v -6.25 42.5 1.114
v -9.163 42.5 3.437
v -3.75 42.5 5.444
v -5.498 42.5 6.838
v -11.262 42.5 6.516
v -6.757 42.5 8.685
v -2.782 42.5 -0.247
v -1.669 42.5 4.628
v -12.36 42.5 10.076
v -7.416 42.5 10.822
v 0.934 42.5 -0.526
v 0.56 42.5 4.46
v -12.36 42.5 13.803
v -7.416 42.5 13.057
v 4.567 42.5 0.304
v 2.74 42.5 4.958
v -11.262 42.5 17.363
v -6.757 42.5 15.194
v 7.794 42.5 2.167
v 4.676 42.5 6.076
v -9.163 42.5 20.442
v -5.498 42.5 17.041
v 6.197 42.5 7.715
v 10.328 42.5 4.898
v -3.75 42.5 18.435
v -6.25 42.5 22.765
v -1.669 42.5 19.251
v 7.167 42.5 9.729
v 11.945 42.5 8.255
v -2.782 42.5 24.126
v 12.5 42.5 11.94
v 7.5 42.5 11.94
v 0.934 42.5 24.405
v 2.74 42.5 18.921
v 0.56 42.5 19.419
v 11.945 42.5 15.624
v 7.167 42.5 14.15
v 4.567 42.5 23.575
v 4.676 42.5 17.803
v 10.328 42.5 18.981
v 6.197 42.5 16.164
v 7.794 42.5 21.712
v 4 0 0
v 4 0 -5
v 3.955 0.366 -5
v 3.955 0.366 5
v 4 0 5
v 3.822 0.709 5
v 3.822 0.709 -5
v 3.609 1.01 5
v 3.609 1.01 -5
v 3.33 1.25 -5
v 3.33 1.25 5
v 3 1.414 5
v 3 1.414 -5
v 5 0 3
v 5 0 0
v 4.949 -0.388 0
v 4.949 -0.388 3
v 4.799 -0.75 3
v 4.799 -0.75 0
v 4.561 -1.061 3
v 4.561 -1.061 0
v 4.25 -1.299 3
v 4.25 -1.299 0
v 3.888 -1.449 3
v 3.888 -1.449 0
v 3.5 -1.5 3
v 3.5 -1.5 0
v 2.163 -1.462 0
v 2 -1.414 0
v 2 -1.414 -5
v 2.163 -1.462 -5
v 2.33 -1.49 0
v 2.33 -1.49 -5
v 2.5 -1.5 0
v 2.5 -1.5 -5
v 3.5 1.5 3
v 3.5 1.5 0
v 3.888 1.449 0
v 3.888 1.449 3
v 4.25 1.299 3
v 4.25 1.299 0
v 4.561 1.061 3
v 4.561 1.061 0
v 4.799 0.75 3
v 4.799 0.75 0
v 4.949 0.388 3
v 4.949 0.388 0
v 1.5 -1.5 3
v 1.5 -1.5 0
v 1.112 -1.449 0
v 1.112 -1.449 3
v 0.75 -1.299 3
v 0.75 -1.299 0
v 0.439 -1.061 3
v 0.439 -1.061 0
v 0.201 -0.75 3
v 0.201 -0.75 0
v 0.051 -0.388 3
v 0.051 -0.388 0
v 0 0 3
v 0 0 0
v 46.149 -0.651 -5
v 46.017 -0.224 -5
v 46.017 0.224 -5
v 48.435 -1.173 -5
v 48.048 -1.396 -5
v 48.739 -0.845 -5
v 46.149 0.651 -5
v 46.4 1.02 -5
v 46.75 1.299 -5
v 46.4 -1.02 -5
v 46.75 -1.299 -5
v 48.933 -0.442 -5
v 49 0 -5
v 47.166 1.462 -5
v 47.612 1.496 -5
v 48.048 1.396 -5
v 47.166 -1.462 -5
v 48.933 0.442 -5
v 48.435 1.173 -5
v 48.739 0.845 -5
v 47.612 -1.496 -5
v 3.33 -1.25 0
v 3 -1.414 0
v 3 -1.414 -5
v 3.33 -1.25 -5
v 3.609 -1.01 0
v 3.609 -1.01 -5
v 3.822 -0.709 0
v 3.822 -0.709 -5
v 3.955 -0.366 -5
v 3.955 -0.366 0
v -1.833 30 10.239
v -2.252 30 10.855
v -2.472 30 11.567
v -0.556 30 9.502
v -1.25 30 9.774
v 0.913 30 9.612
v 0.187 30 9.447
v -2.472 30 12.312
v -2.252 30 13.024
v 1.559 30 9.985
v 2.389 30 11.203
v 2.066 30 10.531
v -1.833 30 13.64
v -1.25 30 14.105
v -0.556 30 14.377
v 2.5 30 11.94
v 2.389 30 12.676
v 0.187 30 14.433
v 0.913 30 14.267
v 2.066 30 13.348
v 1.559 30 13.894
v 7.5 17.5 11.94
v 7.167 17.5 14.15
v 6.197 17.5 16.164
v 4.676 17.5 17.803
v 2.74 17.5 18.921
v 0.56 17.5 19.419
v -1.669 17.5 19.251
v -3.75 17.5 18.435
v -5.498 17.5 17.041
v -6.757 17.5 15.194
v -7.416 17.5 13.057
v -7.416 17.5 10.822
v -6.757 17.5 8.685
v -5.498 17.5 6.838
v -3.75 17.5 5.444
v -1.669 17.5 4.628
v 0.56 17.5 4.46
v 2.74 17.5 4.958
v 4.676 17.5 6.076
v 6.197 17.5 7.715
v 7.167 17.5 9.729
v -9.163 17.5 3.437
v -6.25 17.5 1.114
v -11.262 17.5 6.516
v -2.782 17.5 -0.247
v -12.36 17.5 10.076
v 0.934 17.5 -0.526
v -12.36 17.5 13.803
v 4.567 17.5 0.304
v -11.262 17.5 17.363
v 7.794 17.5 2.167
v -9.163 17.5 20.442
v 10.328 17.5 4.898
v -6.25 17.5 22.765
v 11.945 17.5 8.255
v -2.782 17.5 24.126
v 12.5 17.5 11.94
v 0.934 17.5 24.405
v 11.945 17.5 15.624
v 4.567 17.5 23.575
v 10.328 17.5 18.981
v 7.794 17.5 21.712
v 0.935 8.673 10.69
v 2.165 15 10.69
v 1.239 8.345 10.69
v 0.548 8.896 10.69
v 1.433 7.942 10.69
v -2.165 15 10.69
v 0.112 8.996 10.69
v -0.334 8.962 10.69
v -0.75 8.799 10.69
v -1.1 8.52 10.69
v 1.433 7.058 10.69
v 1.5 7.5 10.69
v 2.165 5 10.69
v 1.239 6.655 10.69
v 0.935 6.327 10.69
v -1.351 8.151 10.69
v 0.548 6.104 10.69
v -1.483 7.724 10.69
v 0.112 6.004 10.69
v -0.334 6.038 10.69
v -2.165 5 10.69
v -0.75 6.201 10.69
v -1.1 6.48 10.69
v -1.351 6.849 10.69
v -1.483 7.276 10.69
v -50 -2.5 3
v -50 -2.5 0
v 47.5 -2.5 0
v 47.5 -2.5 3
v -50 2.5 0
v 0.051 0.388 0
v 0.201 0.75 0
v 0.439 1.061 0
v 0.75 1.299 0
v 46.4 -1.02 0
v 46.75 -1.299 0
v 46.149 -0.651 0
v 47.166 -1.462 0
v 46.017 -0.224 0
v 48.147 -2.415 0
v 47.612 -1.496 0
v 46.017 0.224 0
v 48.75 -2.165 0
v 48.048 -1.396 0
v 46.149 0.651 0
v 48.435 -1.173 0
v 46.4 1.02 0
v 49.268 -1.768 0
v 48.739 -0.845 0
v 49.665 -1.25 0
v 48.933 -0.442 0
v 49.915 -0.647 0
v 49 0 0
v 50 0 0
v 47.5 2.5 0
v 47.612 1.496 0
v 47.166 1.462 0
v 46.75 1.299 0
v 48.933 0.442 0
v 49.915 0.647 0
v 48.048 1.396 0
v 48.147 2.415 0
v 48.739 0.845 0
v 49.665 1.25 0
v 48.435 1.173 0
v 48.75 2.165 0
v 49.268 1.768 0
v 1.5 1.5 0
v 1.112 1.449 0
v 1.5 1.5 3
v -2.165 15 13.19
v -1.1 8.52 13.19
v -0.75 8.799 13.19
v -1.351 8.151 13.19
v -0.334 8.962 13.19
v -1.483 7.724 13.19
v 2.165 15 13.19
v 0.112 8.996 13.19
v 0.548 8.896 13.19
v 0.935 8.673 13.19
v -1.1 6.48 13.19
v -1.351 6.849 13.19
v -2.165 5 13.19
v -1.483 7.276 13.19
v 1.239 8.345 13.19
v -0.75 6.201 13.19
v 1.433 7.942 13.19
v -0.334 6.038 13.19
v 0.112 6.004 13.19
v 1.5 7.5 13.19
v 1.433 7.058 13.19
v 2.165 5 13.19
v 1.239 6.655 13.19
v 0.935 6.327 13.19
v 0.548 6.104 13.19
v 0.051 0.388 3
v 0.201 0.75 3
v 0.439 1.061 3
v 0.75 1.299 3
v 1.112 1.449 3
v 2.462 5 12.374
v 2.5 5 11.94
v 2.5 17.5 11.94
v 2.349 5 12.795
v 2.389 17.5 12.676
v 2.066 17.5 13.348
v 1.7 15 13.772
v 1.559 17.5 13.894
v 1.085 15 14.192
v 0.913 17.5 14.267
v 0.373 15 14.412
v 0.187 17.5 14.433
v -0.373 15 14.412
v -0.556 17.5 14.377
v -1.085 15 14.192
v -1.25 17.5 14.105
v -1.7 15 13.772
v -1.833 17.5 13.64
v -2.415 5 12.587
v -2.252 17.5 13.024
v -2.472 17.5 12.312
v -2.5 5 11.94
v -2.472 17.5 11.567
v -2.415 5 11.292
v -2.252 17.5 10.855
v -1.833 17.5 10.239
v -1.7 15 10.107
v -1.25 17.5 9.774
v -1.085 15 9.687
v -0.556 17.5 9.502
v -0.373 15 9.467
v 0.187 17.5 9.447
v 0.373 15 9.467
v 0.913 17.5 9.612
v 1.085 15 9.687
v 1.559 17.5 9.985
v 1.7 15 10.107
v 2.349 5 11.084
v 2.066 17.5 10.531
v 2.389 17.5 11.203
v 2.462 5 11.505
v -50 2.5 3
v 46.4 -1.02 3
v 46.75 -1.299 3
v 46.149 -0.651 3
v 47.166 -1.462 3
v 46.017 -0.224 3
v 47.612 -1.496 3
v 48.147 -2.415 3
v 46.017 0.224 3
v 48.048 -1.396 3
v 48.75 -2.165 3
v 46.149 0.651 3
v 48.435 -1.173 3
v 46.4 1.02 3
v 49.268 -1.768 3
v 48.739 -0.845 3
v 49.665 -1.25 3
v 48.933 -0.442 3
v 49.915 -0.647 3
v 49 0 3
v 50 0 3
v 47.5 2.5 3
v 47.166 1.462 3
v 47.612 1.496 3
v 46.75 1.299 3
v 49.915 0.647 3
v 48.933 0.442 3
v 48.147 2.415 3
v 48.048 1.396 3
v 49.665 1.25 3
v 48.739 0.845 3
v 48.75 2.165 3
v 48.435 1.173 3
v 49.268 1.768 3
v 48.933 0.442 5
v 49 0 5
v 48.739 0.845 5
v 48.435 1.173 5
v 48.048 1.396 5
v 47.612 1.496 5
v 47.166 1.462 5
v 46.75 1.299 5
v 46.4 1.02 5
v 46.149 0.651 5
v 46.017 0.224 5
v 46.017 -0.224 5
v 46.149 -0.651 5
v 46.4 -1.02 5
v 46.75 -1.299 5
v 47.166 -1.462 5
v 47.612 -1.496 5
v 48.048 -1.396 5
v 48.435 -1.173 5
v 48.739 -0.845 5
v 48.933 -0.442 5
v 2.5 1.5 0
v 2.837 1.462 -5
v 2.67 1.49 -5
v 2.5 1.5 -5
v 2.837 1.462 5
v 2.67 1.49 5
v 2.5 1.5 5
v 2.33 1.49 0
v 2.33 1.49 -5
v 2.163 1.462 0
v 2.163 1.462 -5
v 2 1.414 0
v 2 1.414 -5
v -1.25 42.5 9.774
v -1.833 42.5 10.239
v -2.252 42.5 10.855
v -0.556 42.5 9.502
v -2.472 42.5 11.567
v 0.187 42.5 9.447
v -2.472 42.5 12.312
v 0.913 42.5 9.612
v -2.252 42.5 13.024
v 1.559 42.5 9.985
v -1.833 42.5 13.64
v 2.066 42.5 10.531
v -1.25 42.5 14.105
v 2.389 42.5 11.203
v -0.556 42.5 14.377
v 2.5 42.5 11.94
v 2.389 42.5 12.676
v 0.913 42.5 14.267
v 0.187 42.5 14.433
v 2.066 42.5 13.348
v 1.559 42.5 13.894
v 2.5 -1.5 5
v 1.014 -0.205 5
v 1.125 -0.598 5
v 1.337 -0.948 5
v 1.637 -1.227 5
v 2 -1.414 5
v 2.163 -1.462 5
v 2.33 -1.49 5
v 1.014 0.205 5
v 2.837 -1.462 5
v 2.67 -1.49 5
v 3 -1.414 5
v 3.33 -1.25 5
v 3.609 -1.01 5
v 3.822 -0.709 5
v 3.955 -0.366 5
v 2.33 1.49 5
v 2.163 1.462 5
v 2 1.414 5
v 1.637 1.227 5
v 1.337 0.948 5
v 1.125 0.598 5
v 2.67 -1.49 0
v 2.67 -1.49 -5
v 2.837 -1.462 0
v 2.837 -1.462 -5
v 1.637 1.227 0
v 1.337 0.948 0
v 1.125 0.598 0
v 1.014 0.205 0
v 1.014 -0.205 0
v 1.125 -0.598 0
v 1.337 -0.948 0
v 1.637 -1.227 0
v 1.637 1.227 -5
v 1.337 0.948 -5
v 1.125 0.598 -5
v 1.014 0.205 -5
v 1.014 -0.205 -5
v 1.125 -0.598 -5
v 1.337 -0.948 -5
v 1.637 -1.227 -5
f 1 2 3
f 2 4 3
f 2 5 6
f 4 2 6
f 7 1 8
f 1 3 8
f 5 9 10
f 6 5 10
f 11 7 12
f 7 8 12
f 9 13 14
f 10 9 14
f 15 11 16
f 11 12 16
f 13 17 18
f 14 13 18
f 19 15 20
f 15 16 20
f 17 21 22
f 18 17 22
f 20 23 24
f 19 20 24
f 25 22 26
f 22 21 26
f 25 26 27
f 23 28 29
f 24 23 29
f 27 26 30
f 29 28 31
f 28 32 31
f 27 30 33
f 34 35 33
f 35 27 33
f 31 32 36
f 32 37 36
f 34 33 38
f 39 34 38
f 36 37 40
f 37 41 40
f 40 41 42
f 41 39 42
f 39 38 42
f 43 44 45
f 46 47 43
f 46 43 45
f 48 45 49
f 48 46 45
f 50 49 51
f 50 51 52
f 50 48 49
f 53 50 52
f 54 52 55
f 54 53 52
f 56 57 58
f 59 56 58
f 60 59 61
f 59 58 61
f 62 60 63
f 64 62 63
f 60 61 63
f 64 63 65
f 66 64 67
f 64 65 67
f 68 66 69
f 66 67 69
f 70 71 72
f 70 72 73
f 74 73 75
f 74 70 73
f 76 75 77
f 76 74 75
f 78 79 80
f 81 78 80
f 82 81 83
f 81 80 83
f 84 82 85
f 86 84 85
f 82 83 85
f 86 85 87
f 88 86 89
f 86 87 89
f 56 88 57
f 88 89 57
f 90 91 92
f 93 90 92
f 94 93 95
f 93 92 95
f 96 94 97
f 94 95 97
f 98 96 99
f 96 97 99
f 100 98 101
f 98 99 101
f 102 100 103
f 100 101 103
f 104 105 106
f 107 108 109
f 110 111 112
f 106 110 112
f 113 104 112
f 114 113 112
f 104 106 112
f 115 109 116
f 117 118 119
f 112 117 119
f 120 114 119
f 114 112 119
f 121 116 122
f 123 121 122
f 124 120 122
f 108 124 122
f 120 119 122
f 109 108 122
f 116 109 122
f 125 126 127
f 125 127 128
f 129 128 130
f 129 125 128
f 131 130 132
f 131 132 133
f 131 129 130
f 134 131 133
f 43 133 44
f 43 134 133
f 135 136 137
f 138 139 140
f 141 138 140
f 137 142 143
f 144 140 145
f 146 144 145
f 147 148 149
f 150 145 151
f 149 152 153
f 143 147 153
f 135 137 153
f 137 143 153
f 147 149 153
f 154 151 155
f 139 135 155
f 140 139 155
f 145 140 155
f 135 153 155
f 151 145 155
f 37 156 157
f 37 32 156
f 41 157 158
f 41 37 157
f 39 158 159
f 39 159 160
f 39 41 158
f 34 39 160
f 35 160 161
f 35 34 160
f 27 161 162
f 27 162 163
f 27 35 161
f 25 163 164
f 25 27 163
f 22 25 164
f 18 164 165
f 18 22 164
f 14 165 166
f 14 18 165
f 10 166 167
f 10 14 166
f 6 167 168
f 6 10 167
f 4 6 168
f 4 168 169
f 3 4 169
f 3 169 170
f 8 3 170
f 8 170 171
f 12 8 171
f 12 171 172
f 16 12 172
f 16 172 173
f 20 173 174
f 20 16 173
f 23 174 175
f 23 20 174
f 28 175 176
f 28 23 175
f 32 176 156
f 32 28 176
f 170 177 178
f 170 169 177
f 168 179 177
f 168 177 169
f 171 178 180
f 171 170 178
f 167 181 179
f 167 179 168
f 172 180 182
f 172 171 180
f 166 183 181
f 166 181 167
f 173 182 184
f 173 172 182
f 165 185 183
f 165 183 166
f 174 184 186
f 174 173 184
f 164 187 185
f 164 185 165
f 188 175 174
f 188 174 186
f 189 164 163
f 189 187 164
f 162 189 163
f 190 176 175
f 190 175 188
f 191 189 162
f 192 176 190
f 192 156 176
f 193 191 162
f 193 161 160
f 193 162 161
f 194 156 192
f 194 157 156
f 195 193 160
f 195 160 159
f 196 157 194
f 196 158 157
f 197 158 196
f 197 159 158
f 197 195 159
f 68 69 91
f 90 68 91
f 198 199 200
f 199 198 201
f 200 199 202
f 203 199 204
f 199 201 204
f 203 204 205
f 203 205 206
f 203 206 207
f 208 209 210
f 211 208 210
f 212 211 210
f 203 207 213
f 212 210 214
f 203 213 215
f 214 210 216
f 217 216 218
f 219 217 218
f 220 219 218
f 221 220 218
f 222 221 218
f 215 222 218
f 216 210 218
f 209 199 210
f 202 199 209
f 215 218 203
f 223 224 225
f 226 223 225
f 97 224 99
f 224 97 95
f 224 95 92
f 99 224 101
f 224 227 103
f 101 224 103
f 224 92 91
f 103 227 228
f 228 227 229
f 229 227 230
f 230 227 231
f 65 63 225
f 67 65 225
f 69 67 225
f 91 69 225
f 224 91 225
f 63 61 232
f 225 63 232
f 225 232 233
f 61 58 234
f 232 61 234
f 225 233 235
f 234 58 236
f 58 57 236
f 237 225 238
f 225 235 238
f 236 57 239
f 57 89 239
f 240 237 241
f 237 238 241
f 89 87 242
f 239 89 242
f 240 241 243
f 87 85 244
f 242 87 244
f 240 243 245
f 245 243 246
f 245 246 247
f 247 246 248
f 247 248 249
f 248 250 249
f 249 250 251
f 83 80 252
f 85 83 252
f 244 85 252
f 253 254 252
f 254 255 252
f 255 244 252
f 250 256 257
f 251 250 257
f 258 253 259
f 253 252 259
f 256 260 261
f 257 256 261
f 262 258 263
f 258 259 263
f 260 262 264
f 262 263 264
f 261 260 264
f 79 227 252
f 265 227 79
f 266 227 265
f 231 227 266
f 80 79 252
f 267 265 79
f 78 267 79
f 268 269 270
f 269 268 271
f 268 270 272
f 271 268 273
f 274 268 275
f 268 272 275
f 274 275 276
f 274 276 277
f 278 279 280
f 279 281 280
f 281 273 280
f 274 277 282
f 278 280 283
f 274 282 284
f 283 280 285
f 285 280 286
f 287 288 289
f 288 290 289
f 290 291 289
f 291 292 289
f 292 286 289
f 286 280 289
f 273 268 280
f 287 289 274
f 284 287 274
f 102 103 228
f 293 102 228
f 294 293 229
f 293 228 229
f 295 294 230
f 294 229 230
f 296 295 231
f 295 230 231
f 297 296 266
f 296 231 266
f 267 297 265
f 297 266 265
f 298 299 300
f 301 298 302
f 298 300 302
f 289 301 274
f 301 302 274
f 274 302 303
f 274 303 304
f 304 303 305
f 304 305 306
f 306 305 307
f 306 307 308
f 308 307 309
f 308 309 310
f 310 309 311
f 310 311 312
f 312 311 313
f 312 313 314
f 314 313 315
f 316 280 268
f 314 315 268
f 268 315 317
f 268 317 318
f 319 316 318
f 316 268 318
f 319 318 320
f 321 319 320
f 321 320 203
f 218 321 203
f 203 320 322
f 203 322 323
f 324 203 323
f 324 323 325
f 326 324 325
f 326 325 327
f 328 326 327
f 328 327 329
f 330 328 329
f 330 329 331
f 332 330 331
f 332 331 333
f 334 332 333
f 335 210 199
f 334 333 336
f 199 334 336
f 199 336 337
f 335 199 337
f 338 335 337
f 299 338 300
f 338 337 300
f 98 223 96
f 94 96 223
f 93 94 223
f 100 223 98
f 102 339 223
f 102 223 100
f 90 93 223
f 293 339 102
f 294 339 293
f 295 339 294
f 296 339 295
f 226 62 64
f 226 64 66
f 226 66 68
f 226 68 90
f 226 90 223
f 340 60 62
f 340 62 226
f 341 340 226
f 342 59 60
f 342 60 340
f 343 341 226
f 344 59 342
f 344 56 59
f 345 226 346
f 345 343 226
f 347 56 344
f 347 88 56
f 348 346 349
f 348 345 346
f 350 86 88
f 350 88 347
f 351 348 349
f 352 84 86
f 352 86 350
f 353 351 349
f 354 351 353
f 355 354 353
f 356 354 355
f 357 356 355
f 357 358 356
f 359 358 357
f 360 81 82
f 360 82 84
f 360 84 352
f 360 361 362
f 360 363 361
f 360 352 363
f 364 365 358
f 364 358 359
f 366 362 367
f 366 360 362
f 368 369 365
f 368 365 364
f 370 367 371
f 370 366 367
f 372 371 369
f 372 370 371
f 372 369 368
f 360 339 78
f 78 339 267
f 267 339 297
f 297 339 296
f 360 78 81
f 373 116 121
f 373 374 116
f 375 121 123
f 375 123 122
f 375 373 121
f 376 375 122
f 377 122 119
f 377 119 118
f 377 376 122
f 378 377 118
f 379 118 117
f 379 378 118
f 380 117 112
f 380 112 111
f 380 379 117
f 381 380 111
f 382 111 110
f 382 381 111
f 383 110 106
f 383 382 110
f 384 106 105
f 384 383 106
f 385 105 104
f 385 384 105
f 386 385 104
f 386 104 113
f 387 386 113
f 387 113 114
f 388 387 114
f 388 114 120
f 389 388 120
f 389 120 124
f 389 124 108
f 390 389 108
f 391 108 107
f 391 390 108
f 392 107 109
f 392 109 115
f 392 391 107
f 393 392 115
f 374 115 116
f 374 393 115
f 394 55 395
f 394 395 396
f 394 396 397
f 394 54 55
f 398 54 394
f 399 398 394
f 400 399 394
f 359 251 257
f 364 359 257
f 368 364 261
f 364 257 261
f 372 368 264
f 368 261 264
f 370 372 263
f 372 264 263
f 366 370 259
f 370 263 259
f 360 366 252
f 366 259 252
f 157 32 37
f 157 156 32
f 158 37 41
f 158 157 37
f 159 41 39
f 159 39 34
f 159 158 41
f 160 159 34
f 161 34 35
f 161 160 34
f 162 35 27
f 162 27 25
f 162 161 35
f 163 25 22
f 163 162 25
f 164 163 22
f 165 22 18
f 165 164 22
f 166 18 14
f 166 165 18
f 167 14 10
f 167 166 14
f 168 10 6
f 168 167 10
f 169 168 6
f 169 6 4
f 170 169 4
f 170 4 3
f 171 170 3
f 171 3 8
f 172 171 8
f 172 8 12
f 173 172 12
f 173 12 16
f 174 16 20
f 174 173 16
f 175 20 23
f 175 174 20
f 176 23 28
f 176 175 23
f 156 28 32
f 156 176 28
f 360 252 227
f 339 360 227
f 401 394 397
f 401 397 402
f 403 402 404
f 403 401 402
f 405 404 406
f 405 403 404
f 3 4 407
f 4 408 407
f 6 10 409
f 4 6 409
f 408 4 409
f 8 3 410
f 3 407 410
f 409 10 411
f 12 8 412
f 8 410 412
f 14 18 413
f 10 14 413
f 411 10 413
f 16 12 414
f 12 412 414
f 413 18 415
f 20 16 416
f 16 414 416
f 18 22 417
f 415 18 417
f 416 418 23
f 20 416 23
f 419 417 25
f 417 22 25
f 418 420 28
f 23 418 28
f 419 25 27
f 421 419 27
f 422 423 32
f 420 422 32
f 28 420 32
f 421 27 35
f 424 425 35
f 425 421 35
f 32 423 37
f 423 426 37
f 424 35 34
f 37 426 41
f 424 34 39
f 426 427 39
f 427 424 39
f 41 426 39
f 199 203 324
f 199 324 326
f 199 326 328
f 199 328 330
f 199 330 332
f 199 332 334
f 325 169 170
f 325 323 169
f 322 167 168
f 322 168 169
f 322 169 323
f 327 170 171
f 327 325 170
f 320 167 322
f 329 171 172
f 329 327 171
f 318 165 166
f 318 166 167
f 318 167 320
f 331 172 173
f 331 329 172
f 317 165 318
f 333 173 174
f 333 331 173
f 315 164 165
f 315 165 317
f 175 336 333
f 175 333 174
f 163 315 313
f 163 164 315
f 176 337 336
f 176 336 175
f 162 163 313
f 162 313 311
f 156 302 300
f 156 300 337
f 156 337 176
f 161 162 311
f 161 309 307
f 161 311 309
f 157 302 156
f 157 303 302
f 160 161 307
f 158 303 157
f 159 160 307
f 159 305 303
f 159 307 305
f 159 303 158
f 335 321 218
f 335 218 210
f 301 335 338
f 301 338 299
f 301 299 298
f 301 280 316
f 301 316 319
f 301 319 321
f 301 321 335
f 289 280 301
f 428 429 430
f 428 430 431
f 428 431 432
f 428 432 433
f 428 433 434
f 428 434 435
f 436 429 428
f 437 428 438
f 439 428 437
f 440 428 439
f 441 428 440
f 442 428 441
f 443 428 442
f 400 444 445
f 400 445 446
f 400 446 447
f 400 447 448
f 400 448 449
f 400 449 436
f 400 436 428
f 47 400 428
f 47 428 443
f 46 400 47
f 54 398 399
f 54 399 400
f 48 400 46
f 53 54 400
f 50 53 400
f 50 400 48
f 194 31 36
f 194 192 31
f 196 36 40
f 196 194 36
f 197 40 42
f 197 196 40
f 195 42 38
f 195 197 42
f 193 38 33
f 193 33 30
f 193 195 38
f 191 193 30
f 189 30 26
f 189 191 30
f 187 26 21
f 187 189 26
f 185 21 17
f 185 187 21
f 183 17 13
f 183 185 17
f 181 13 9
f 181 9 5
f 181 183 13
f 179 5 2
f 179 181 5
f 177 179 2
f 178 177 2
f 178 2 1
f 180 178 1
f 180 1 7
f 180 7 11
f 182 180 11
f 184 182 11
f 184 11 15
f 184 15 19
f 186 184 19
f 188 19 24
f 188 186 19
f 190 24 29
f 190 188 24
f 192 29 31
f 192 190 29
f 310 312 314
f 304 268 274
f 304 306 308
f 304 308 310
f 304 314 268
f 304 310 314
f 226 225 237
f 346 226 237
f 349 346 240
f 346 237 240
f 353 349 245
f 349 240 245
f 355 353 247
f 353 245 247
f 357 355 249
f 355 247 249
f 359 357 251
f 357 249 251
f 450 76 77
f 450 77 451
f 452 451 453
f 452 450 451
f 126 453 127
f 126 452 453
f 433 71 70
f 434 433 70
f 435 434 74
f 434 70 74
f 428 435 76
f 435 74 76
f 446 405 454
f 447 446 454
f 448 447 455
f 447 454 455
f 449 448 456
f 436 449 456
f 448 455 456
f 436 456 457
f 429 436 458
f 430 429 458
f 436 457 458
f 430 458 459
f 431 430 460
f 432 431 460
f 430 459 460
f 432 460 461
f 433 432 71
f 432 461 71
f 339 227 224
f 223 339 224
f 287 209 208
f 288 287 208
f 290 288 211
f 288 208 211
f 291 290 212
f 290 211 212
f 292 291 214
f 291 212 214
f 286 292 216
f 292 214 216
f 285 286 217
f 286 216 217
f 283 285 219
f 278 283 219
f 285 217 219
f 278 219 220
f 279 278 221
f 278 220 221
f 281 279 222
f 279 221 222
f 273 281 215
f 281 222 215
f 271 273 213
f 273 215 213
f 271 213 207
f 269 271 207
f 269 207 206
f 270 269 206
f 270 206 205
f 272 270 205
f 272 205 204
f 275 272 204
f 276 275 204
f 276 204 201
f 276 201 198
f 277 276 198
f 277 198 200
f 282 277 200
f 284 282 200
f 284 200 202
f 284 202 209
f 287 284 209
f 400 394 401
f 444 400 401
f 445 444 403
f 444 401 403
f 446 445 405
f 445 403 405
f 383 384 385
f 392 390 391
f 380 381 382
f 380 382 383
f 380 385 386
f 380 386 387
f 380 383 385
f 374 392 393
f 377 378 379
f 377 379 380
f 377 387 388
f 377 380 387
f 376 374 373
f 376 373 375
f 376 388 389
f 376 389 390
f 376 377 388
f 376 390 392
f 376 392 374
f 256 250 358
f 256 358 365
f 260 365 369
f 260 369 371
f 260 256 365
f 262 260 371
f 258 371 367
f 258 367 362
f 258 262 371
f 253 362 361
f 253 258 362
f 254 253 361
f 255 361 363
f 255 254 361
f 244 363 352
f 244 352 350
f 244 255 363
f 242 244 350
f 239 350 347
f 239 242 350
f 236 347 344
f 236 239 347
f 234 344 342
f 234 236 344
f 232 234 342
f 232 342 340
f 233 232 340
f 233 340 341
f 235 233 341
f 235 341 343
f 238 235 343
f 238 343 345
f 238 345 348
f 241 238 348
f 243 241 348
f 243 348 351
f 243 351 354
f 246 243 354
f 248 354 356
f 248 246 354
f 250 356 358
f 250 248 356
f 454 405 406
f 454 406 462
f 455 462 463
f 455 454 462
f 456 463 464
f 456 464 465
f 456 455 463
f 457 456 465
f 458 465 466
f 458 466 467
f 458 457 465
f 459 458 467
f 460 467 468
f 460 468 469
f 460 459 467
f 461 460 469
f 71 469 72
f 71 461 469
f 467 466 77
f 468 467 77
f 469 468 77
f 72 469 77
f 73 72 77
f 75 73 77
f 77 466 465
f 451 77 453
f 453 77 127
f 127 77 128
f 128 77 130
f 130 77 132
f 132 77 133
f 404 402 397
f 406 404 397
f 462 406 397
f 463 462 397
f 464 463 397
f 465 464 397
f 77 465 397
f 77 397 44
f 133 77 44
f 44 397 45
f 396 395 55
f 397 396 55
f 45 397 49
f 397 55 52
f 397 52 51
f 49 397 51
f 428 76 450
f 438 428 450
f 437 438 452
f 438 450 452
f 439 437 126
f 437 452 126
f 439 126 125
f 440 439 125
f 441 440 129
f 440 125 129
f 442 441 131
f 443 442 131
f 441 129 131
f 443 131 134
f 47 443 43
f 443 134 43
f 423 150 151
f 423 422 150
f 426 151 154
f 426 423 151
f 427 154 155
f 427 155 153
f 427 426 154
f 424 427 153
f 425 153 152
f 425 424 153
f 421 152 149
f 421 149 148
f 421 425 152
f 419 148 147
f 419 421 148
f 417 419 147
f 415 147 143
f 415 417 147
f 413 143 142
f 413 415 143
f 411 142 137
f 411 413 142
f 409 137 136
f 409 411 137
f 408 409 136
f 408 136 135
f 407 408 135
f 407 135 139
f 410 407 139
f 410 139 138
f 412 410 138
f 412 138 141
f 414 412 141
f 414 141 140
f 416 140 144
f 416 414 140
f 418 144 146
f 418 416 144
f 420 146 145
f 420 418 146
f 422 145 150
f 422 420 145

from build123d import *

# Parameters (mm, degrees)
F0_R      = 1.5
F1_DEPTH  = 3
F2_DEPTH  = 5
F4_R      = 12.5
F4_R_2    = 7.5
F5_DEPTH  = 12.5
F4_R_3    = 2.5
F6_DEPTH  = 12.5
F7_DEPTH  = 25
F9_DEPTH  = 10
F10_R     = 1.5
F11_DEPTH = 25


# Not quite as in the source:
# - a feature names something its author has since deleted; it is built from what else it names


with BuildPart() as f1:
    # F0 (on Top) → F1 (new body)
    with BuildSketch(Plane.XY):
        with BuildLine():
            ThreePointArc((47.5, -2.5), (45, 0), (47.5, 2.5))
            Line((47.5, 2.5), (-50, 2.5))
            Line((-50, 2.5), (-50, -2.5))
            Line((-50, -2.5), (47.5, -2.5))
        make_face()
        Polygon((1.5, 1.5), (2.5, 1.5), (3.5, 1.5), (5, 1.5), (5, 0), (5, -1.5), (3.5, -1.5), (2.5, -1.5), (1.5, -1.5), (0, -1.5), (0, 0), (0, 1.5), align=None, mode=Mode.SUBTRACT)
        with BuildLine():
            ThreePointArc((50, 0), (49.267766953, 1.767766953), (47.5, 2.5))
            ThreePointArc((47.5, 2.5), (45, 0), (47.5, -2.5))
            ThreePointArc((47.5, -2.5), (49.267766953, -1.767766953), (50, 0))
        make_face()
        with Locations((47.5, 0)):
            Circle(F0_R, mode=Mode.SUBTRACT)
        with BuildLine():
            ThreePointArc((0, 0), (0.4393398282, 1.0606601718), (1.5, 1.5))
            Line((1.5, 1.5), (0, 1.5))
            Line((0, 1.5), (0, 0))
        make_face()
        with BuildLine():
            Line((0, -1.5), (1.5, -1.5))
            ThreePointArc((1.5, -1.5), (0.4393398282, -1.0606601718), (0, 0))
            Line((0, 0), (0, -1.5))
        make_face()
        with BuildLine():
            ThreePointArc((5, 0), (4.5606601718, -1.0606601718), (3.5, -1.5))
            Line((3.5, -1.5), (5, -1.5))
            Line((5, -1.5), (5, 0))
        make_face()
        with BuildLine():
            Line((5, 1.5), (3.5, 1.5))
            ThreePointArc((3.5, 1.5), (4.5606601718, 1.0606601718), (5, 0))
            Line((5, 0), (5, 1.5))
        make_face()
    extrude(amount=F1_DEPTH)


with BuildPart() as f2:
    # F0 (on Top) → F2 (new body, symmetric)
    with BuildSketch(Plane.XY):
        with BuildLine():
            ThreePointArc((2.5, 1.1180339887), (2.7355194018, 1.290569415), (3, 1.4142135624))
            ThreePointArc((3, 1.4142135624), (2.7536529681, 1.4783978395), (2.5, 1.5))
            ThreePointArc((2.5, 1.5), (2.2463470319, 1.4783978395), (2, 1.4142135624))
            ThreePointArc((2, 1.4142135624), (2.2644805982, 1.290569415), (2.5, 1.1180339887))
        make_face()
        with BuildLine():
            ThreePointArc((2.5, -1.5), (2.7536529681, -1.4783978395), (3, -1.4142135624))
            ThreePointArc((3, -1.4142135624), (2.7355194018, -1.290569415), (2.5, -1.1180339887))
            ThreePointArc((2.5, -1.1180339887), (2.2644805982, -1.290569415), (2, -1.4142135624))
            ThreePointArc((2, -1.4142135624), (2.2463470319, -1.4783978395), (2.5, -1.5))
        make_face()
        with BuildLine():
            ThreePointArc((2.5, -1.1180339887), (2, 0), (2.5, 1.1180339887))
            ThreePointArc((2.5, 1.1180339887), (2.2644805982, 1.290569415), (2, 1.4142135624))
            ThreePointArc((2, 1.4142135624), (1, 0), (2, -1.4142135624))
            ThreePointArc((2, -1.4142135624), (2.2644805982, -1.290569415), (2.5, -1.1180339887))
        make_face()
        with BuildLine():
            ThreePointArc((3, -1.4142135624), (3.7247448714, -0.8660254038), (4, 0))
            ThreePointArc((4, 0), (3.7247448714, 0.8660254038), (3, 1.4142135624))
            ThreePointArc((3, 1.4142135624), (2.7355194018, 1.290569415), (2.5, 1.1180339887))
            ThreePointArc((2.5, 1.1180339887), (2.8693063938, 0.6123724357), (3, 0))
            ThreePointArc((3, 0), (2.8693063938, -0.6123724357), (2.5, -1.1180339887))
            ThreePointArc((2.5, -1.1180339887), (2.7355194018, -1.290569415), (3, -1.4142135624))
        make_face()
        with BuildLine():
            ThreePointArc((3, 0), (2.8693063938, 0.6123724357), (2.5, 1.1180339887))
            ThreePointArc((2.5, 1.1180339887), (2, 0), (2.5, -1.1180339887))
            ThreePointArc((2.5, -1.1180339887), (2.8693063938, -0.6123724357), (3, 0))
        make_face()
    extrude(amount=F2_DEPTH, both=True)


with BuildPart() as f2b:
    # F0 (on Top) → F2, piece 2 (new body, symmetric)
    with BuildSketch(Plane.XY):
        with Locations((47.5, 0)):
            Circle(F0_R)
    extrude(amount=F2_DEPTH, both=True)


with BuildPart() as f5:
    # F4 (on offset) → F5 (new body, symmetric)
    with BuildSketch(Plane.XZ.offset(-30)):
        with Locations((0, 11.9395209476)):
            Circle(F4_R)
        with Locations((0, 11.9395209476)):
            Circle(F4_R_2, mode=Mode.SUBTRACT)
    extrude(amount=F5_DEPTH, both=True)


with BuildPart() as f6:
    # F4 (on offset) → F6 (new body, symmetric)
    with BuildSketch(Plane.XZ.offset(-30)):
        with Locations((0, 11.9395209476)):
            Circle(F4_R_2)
        with Locations((0, 11.9395209476)):
            Circle(F4_R_3, mode=Mode.SUBTRACT)
    extrude(amount=F6_DEPTH, both=True)

    # F4 (on offset) → F7 (join)
    with BuildSketch(Plane.XZ.offset(-30)):
        with Locations((0, 11.9395209476)):
            Circle(F4_R_3)
    extrude(amount=F7_DEPTH)

    # F8 (on face) → F9 (cut)
    with BuildSketch(Plane.XZ.offset(-5)):
        with BuildLine():
            ThreePointArc((-2.1650635095, 10.6895209476), (0, 9.4395209476), (2.1650635095, 10.6895209476))
            Line((2.1650635095, 10.6895209476), (-2.1650635095, 10.6895209476))
        make_face()
        with BuildLine():
            Line((-2.1650635095, 13.1895209476), (2.1650635095, 13.1895209476))
            ThreePointArc((2.1650635095, 13.1895209476), (0, 14.4395209476), (-2.1650635095, 13.1895209476))
        make_face()
    extrude(amount=-F9_DEPTH, mode=Mode.SUBTRACT)

    # F10 (on face) → F11 (cut)
    with BuildSketch(Plane(origin=(0, 0, 10.6895209476), x_dir=(1, 0, 0), z_dir=(0, 0, -1))):
        with Locations((0, -7.5)):
            Circle(F10_R)
    extrude(amount=-F11_DEPTH, mode=Mode.SUBTRACT)


solid = Compound([f1.part, f2.part, f2b.part, f5.part, f6.part])
